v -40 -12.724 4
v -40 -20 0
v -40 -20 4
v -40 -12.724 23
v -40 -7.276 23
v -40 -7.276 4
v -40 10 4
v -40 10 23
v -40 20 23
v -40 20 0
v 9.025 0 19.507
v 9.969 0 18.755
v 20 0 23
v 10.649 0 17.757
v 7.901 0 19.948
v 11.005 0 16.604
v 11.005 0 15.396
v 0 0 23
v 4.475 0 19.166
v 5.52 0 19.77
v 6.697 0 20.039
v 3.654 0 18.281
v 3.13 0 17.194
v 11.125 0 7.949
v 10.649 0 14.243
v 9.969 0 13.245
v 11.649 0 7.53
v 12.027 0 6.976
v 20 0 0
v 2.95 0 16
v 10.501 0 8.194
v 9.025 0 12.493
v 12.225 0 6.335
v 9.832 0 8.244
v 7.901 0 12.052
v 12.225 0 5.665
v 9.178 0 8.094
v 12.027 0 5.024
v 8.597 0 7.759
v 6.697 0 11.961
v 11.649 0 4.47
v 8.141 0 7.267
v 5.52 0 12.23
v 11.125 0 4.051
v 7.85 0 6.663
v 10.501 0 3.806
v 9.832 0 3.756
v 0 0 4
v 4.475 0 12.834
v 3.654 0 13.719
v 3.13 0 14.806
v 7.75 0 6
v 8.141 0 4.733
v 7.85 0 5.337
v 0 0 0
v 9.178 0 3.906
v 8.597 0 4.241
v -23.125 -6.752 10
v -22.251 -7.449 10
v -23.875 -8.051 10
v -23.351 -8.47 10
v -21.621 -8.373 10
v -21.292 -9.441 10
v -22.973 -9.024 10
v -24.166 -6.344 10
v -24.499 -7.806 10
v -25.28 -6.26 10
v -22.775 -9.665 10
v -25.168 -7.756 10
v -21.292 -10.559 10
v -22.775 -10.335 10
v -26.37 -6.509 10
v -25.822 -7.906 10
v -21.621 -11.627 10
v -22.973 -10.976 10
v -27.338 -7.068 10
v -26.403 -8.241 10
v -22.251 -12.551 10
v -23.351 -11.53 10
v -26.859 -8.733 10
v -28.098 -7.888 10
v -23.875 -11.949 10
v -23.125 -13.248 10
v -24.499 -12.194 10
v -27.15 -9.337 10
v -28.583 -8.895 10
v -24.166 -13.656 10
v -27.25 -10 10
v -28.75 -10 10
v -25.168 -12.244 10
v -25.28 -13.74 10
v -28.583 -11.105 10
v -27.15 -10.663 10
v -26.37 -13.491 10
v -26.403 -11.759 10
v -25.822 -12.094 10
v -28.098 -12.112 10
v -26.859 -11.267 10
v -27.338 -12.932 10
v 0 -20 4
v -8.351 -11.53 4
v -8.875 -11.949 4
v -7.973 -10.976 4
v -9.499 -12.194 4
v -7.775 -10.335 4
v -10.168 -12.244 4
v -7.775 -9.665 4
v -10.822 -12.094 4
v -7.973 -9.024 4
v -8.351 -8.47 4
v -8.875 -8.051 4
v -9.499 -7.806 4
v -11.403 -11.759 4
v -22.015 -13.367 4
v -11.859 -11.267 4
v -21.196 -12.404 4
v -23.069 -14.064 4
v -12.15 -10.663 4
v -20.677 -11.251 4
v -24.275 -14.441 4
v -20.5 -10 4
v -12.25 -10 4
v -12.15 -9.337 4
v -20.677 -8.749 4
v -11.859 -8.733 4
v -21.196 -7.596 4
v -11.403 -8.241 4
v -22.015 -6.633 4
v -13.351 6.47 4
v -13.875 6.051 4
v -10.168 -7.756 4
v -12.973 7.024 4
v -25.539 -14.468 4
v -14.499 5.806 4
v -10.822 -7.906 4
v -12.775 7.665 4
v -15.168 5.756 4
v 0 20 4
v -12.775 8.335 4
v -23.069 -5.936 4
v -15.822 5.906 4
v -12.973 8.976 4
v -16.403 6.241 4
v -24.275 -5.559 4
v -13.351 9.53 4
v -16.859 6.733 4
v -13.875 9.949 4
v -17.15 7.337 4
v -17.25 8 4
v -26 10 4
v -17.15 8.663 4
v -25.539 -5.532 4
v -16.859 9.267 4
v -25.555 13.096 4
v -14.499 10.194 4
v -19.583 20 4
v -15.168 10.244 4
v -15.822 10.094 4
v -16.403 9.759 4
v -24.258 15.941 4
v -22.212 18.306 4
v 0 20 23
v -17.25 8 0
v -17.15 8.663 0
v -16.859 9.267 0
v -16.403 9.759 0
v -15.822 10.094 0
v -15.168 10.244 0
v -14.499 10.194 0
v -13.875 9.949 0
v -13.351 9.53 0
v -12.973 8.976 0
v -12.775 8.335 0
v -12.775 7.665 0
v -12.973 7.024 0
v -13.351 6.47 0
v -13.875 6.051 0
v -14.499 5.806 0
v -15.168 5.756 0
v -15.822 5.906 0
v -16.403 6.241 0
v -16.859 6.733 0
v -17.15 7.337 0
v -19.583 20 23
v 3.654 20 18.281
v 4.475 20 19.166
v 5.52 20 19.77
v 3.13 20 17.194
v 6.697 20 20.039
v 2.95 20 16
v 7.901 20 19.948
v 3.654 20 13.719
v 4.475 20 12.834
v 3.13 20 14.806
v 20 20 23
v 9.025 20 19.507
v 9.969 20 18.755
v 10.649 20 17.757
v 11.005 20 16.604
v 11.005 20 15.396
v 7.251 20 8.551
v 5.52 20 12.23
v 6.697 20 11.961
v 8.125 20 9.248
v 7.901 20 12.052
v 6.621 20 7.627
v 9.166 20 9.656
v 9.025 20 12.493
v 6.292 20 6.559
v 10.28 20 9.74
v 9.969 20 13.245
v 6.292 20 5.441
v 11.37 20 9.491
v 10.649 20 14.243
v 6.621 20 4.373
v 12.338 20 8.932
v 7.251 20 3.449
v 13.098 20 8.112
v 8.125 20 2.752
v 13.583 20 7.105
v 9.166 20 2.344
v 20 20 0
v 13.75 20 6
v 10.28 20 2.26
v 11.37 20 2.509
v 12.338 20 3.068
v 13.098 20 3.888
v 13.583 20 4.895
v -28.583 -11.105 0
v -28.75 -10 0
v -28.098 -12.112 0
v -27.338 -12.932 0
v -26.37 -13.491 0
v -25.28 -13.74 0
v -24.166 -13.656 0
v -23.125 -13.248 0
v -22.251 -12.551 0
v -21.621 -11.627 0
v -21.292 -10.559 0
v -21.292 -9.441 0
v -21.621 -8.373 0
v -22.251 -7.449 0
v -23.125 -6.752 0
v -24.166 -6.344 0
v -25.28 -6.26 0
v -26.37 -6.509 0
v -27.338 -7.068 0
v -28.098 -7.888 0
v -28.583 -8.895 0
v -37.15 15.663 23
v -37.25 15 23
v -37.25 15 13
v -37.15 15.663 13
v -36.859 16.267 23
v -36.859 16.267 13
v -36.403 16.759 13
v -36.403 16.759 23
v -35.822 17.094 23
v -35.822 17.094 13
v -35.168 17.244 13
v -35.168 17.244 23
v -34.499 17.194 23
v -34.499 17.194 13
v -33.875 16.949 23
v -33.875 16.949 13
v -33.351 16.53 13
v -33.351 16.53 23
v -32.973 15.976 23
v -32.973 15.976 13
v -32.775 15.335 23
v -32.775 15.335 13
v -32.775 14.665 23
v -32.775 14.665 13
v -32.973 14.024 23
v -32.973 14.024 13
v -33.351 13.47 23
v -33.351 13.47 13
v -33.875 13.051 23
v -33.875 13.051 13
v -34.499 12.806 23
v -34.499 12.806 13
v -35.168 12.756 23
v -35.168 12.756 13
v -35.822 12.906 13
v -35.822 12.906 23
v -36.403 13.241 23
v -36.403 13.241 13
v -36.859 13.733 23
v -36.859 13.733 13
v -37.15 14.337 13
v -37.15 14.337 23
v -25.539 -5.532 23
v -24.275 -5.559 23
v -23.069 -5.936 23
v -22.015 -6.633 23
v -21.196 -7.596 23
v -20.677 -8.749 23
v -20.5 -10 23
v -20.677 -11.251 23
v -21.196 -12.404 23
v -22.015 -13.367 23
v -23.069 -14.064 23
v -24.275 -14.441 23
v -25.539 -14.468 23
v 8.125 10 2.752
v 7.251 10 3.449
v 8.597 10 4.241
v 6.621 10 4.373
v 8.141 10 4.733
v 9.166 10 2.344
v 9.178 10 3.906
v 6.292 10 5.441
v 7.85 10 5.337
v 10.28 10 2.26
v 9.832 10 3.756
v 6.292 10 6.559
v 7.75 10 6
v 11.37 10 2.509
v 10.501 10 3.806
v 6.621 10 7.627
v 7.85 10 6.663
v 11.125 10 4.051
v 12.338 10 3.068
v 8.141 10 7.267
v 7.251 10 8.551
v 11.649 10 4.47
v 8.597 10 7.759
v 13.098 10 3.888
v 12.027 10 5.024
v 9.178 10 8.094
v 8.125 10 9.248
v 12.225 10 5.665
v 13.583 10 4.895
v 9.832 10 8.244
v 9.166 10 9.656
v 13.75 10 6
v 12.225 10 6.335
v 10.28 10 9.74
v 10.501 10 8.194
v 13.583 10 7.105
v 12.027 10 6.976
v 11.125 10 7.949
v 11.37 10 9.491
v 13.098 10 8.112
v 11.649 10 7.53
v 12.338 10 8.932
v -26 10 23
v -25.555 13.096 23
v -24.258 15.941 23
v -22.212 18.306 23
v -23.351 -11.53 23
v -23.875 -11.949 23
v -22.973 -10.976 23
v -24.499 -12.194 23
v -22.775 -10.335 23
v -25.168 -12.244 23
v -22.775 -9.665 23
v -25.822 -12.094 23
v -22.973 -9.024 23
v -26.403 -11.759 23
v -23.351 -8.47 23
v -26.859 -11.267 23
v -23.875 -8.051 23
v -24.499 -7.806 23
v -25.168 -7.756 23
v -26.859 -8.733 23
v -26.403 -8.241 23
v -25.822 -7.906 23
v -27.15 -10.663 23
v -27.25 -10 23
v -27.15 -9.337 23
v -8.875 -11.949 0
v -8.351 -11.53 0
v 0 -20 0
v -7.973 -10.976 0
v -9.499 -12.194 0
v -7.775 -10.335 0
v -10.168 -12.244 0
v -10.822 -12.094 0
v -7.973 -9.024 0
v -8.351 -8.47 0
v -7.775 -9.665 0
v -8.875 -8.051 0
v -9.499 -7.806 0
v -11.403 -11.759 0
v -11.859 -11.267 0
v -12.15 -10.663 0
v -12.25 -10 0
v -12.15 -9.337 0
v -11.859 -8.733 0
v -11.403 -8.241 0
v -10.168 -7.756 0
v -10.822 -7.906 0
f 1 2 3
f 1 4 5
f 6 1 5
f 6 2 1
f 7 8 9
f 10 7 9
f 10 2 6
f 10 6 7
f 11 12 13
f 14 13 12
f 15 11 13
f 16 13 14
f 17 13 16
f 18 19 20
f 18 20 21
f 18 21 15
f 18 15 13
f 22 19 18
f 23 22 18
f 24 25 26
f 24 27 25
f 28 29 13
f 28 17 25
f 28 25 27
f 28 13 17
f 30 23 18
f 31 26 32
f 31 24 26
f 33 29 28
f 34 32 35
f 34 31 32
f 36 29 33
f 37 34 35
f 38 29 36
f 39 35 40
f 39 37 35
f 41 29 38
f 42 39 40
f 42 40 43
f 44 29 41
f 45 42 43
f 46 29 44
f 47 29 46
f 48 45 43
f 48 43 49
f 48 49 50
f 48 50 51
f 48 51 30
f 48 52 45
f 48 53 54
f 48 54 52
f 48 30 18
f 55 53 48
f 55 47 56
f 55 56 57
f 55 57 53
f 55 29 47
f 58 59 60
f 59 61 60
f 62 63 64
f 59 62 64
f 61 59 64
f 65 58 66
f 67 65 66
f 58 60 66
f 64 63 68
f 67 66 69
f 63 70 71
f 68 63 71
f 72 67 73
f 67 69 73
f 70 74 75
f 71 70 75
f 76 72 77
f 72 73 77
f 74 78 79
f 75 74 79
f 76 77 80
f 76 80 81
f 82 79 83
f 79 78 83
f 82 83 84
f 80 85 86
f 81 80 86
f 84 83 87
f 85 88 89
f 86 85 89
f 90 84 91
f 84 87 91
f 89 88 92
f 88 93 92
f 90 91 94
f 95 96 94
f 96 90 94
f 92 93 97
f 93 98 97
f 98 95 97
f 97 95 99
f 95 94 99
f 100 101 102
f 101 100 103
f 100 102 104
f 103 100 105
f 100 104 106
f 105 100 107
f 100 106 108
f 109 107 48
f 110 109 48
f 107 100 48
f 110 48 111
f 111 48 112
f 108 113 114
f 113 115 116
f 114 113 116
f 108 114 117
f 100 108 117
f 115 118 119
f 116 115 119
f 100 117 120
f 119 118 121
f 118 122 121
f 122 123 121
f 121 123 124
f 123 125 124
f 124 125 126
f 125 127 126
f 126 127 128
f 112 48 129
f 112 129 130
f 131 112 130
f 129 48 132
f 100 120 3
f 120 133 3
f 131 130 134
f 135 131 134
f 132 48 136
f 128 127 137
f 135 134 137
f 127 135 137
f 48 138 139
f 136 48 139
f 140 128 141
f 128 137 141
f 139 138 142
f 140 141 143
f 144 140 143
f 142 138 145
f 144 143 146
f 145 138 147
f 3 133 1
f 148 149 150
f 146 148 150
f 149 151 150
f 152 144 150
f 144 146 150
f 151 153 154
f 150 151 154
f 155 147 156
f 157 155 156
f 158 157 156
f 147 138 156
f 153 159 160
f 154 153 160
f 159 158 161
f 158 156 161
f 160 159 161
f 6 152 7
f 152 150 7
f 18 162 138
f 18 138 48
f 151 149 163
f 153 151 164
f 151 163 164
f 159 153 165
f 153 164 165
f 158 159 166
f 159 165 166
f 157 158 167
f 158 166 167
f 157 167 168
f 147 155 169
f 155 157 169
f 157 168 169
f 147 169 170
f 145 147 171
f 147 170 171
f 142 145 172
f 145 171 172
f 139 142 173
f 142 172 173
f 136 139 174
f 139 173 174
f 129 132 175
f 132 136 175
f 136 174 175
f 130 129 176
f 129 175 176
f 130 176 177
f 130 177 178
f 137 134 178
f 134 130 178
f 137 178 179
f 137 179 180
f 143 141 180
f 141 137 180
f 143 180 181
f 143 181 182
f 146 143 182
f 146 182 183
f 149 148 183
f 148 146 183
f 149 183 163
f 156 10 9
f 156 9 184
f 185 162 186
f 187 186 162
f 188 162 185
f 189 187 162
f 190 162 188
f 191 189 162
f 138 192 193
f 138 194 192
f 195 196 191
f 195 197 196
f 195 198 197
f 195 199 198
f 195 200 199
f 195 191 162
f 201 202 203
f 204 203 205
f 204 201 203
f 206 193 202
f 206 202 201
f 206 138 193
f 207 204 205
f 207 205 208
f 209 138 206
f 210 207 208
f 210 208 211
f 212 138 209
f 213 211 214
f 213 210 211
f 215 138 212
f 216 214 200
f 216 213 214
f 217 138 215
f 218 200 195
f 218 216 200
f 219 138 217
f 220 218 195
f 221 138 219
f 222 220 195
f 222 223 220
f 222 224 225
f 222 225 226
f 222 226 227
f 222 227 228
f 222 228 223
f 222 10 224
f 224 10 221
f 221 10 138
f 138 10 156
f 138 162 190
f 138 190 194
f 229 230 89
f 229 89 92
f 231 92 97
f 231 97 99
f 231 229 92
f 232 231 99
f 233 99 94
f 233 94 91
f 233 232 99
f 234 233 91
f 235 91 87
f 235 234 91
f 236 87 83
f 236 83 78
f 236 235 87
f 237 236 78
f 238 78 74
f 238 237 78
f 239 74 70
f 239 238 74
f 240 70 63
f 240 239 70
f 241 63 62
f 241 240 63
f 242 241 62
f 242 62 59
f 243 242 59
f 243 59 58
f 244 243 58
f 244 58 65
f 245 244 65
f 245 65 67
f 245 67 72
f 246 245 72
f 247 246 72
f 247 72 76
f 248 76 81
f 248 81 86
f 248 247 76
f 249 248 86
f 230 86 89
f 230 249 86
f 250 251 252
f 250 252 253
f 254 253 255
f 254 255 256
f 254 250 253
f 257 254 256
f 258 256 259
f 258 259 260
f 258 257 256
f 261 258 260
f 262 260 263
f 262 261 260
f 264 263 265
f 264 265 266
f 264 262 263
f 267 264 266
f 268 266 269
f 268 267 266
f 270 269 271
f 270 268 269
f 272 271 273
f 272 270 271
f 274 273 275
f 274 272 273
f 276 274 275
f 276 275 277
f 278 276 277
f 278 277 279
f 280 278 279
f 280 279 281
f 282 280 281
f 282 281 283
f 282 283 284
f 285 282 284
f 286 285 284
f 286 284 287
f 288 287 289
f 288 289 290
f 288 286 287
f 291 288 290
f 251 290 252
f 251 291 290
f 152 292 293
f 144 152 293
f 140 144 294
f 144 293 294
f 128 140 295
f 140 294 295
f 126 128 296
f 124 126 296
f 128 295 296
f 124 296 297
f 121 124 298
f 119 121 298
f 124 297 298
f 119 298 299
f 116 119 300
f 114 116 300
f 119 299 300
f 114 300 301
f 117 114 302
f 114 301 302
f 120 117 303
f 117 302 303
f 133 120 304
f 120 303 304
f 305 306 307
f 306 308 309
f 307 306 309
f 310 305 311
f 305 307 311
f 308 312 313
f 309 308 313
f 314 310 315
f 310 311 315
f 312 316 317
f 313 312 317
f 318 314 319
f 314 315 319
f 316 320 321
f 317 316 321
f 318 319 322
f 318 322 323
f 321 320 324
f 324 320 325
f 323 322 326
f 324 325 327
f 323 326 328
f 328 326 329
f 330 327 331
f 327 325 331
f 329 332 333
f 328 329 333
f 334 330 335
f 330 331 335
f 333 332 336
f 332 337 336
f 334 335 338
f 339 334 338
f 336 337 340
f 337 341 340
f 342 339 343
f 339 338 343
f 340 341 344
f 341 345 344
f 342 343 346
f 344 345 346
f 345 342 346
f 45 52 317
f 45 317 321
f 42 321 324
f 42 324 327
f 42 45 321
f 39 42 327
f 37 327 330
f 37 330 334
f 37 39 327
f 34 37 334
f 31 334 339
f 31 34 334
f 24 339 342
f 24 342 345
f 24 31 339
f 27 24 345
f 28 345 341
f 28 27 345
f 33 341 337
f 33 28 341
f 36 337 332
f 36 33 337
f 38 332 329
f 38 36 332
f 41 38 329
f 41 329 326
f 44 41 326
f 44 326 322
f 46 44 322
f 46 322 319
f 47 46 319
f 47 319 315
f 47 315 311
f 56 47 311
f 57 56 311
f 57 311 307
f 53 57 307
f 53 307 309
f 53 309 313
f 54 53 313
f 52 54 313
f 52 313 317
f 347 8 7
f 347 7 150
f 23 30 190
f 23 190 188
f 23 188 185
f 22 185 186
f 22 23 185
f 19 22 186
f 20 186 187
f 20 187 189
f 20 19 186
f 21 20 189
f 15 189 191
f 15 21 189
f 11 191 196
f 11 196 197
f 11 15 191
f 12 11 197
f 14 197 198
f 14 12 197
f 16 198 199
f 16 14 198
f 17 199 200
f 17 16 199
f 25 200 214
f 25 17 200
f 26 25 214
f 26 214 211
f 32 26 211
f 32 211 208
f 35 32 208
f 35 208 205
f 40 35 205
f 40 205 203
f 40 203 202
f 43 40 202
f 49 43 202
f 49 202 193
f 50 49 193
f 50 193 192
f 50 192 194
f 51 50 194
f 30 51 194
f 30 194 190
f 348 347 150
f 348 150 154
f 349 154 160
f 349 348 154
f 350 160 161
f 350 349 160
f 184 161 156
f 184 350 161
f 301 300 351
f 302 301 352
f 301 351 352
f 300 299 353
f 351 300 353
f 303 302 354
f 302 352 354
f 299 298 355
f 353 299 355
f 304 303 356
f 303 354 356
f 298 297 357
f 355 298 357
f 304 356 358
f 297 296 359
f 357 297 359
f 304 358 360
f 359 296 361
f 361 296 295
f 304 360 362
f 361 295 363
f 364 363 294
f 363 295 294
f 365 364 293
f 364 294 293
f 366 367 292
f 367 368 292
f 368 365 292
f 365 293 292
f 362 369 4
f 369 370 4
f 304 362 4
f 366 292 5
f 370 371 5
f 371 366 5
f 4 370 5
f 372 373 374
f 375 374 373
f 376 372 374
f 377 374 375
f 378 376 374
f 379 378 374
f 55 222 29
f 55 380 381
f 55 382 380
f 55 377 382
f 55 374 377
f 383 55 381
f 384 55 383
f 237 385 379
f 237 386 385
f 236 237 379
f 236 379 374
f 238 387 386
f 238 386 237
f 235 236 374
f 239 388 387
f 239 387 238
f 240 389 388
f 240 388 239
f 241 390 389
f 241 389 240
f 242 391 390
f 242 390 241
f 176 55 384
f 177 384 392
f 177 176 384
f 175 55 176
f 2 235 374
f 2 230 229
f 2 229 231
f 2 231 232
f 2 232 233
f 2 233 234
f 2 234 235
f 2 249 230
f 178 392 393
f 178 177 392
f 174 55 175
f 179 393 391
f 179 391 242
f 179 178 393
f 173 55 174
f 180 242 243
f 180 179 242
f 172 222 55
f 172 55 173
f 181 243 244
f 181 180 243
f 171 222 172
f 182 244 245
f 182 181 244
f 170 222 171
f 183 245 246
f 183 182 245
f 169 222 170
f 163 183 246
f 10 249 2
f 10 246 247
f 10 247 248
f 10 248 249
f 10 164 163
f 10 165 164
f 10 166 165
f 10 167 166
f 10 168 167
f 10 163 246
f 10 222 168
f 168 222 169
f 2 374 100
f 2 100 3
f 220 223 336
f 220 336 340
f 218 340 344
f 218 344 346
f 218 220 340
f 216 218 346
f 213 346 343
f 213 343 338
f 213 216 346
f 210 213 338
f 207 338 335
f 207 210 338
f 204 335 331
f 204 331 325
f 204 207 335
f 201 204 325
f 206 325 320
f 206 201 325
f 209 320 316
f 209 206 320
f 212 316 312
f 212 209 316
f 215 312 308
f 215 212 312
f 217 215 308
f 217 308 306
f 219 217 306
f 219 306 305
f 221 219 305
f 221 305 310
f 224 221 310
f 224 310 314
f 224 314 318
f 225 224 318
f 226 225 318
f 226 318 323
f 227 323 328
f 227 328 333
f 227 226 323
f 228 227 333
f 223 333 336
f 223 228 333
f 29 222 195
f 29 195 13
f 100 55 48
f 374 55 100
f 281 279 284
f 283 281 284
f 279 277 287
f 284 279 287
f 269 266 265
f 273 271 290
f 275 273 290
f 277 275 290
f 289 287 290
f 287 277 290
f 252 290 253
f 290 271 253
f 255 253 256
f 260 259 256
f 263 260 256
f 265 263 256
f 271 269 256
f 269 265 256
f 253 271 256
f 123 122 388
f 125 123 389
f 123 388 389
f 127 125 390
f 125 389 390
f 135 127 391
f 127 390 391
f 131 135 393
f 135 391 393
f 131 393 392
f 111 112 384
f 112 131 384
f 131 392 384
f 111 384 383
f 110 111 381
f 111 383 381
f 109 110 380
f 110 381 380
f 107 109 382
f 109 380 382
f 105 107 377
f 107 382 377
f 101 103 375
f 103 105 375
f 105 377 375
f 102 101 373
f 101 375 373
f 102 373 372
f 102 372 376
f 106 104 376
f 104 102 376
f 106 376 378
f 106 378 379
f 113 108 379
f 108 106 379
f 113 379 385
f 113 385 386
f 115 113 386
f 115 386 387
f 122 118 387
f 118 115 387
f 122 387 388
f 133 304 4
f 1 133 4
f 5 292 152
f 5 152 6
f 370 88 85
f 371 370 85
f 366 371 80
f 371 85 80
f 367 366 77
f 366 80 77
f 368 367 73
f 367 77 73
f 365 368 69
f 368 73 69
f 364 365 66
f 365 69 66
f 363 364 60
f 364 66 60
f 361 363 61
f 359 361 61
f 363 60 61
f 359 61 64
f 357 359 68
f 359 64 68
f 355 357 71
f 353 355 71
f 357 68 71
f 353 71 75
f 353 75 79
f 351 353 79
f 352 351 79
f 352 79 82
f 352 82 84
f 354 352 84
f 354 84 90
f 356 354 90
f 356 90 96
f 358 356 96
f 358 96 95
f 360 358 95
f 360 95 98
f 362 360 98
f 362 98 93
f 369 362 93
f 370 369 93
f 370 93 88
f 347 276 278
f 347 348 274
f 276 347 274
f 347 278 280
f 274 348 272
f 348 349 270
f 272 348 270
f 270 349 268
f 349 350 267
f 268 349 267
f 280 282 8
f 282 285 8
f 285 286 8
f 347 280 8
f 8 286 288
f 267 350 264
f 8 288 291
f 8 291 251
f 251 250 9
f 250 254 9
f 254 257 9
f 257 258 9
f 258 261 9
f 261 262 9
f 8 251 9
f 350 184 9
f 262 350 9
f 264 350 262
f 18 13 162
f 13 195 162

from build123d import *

# Parameters (mm, degrees)
SKETCH_R        = 2.25
PAD_DEPTH       = 23
POCKET_DEPTH    = 19
SKETCH002_R     = 4.05
SKETCH002_R_2   = 2.25
POCKET001_DEPTH = 20.001
SKETCH003_R     = 2.25
POCKET002_DEPTH = 10
SKETCH004_R     = 3.75
POCKET003_DEPTH = 10
SKETCH005_R     = 3.75
POCKET004_DEPTH = 10


with BuildPart() as pocket004:
    # Sketch → Pad (new body)
    with BuildSketch(Plane.XY):
        Polygon((0, -20), (40, -20), (40, 20), (-20, 20), (-20, 0), (0, 0), align=None)
        with Locations((15, 8)):
            Circle(SKETCH_R, mode=Mode.SUBTRACT)
        with Locations((10, -10)):
            Circle(SKETCH_R, mode=Mode.SUBTRACT)
        with Locations((25, -10)):
            Circle(SKETCH_R, mode=Mode.SUBTRACT)
    extrude(amount=PAD_DEPTH)

    # Sketch001 → Pocket (cut)
    with BuildSketch(Plane.XY.offset(23)):
        with BuildLine():
            Line((46, 10), (26, 10))
            ThreePointArc((26, 10), (22.778175, 17.778175), (15, 21))
            Line((15, 21), (0, 21))
            Line((0, 21), (0, -23))
            Line((0, -23), (46, -23))
            Line((46, -23), (46, -12))
            Line((25.538775, -14.46763), (46, -12))
            ThreePointArc((25.538775, -5.53237), (20.5, -10), (25.538775, -14.46763))
            Line((25.538775, -5.53237), (46, -8))
            Line((46, -8), (46, 10))
        make_face()
    extrude(amount=-POCKET_DEPTH, mode=Mode.SUBTRACT)

    # Sketch002 → Pocket001 (cut, through all)
    with BuildSketch(Plane.XZ):
        with Locations((-7, 16)):
            Circle(SKETCH002_R)
        with Locations((-10, 6)):
            Circle(SKETCH002_R_2)
    extrude(amount=-POCKET001_DEPTH, mode=Mode.SUBTRACT)

    # Sketch003 → Pocket002 (cut)
    with BuildSketch(Plane.XY.offset(23)):
        with Locations((35, 15)):
            Circle(SKETCH003_R)
    extrude(amount=-POCKET002_DEPTH, mode=Mode.SUBTRACT)

    # Sketch004 → Pocket003 (cut)
    with BuildSketch(Plane(origin=(0, 20, 0), x_dir=(-1, 0, 0), z_dir=(0, 1, 0))):
        with Locations((10, 6)):
            Circle(SKETCH004_R)
    extrude(amount=-POCKET003_DEPTH, mode=Mode.SUBTRACT)

    # Sketch005 → Pocket004 (cut)
    with BuildSketch(Plane(origin=(0, 0, 0), x_dir=(1, 0, 0), z_dir=(0, 0, -1))):
        with Locations((25, 10)):
            Circle(SKETCH005_R)
    extrude(amount=-POCKET004_DEPTH, mode=Mode.SUBTRACT)


with BuildPart() as part_mirroring:
    # Part__Mirroring: instance of Pocket004
    add(pocket004.part.mirror(Plane(origin=(0, 0, 0), x_dir=(0, -1, 0), z_dir=(1, 0, 0))))


solid = part_mirroring.part
